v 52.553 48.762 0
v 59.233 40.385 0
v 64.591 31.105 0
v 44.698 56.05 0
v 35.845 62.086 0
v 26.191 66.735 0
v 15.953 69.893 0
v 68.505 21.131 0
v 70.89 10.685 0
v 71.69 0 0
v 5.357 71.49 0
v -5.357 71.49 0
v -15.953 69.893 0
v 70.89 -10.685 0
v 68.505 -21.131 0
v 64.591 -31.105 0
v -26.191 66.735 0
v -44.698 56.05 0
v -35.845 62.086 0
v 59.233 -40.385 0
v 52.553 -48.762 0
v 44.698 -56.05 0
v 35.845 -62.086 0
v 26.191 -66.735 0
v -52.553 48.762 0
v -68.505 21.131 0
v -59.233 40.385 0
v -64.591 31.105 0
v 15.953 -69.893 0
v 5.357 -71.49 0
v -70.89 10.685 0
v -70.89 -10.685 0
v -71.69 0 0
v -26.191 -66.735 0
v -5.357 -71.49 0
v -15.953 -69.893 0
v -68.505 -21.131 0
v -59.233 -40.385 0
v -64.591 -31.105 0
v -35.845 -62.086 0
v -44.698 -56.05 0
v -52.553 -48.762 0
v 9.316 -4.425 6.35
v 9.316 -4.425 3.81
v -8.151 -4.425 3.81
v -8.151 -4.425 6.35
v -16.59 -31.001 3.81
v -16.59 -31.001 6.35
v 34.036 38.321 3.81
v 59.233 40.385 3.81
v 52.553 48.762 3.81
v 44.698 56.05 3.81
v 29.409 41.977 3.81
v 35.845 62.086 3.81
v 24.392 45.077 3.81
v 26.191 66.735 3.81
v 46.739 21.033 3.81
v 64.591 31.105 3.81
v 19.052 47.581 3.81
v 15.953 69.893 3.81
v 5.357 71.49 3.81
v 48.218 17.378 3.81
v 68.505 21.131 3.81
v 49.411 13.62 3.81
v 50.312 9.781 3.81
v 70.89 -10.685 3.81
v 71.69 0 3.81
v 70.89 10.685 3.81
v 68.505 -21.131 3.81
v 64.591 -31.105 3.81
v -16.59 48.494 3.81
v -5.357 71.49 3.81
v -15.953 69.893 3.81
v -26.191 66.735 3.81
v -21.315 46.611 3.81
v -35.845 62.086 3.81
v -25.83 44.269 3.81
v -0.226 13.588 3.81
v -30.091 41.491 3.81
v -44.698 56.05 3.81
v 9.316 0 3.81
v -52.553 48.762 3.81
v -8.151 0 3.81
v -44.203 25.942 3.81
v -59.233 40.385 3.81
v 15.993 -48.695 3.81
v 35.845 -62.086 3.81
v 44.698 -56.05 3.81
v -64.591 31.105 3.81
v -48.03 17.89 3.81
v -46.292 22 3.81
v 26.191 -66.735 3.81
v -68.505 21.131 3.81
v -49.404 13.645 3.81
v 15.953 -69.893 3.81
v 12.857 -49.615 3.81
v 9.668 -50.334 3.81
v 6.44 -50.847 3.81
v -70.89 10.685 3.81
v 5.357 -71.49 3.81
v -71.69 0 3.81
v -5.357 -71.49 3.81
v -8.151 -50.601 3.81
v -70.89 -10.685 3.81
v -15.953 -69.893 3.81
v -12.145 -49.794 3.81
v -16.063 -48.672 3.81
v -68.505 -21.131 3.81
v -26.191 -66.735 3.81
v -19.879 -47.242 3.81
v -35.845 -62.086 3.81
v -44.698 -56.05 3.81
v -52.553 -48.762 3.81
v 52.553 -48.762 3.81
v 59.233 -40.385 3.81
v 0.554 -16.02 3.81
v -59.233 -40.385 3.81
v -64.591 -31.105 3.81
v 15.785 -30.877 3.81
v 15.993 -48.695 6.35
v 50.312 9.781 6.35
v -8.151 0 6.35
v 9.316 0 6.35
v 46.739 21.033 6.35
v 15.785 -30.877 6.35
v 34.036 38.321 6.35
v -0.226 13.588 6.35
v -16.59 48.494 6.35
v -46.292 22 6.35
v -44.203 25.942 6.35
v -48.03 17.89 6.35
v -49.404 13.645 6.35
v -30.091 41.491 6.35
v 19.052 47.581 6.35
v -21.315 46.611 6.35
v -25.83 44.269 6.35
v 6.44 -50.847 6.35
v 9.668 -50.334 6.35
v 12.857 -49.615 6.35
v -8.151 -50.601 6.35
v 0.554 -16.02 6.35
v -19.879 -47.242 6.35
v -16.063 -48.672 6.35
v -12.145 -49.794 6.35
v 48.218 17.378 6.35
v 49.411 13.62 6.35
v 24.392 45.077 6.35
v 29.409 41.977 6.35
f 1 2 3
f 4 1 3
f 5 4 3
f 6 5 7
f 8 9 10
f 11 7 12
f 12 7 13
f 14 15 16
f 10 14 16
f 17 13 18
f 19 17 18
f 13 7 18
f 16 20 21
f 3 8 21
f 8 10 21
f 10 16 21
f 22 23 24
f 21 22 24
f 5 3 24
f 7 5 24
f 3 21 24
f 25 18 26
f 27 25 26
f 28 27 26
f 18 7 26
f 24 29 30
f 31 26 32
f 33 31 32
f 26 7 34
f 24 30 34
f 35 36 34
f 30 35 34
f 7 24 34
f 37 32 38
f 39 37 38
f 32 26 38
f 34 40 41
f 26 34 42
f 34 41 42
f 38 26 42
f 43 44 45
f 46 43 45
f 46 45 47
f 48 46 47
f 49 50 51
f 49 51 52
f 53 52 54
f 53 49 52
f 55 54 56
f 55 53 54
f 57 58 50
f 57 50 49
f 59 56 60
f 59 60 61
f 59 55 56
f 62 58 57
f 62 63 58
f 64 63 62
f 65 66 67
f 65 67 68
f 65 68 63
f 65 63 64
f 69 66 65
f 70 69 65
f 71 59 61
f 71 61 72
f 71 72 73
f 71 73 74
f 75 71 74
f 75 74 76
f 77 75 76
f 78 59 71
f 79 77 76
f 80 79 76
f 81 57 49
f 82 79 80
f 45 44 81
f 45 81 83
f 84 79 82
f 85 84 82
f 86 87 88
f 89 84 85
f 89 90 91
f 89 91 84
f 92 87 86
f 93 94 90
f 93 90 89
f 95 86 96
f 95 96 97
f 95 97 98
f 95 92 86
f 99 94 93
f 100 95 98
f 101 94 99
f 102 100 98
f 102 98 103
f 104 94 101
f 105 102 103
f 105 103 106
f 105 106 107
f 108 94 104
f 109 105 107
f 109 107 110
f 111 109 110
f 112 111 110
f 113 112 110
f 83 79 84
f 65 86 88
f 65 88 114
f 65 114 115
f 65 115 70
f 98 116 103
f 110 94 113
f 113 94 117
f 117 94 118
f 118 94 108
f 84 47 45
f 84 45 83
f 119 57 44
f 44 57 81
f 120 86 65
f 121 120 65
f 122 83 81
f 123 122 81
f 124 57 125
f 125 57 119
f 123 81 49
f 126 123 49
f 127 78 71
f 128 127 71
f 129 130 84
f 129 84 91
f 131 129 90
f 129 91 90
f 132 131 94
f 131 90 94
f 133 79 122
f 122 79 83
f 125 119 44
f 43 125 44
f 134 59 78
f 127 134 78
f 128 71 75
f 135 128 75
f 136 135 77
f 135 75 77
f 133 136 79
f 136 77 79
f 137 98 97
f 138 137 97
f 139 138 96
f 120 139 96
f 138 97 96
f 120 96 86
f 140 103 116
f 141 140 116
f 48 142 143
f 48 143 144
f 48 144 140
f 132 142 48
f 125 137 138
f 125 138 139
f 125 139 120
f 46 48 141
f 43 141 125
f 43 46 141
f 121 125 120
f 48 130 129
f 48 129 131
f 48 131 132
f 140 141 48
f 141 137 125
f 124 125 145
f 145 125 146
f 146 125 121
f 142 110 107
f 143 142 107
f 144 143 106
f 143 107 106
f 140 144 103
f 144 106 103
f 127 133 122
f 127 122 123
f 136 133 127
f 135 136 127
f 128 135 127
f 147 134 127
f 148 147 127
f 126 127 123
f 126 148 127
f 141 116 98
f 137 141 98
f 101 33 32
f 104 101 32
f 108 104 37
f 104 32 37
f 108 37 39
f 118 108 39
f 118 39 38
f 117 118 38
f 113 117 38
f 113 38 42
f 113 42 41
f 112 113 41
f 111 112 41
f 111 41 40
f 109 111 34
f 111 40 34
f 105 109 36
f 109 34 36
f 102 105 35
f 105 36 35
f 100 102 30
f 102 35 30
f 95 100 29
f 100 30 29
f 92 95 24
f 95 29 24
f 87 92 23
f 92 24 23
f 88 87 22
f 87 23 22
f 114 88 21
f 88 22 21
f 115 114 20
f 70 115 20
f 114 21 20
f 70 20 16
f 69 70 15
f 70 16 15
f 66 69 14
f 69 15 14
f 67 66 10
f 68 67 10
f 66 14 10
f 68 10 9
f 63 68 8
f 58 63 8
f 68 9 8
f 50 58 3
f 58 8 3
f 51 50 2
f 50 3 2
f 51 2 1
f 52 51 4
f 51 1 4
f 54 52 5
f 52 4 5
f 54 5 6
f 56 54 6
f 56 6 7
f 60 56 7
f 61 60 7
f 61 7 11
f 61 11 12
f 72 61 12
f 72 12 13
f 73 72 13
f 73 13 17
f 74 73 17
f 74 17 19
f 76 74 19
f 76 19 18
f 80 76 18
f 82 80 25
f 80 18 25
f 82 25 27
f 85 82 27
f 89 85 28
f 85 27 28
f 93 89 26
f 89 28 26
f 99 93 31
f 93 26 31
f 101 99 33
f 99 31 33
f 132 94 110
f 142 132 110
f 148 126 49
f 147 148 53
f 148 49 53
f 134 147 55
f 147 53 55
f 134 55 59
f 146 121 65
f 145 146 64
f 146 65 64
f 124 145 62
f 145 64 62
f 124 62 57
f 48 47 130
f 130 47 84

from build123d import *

# Parameters (mm, degrees)
SKETCH1_R            = 58.990480392
BOSS_EXTRUDE4_DEPTH  = 3.81
BOSS_EXTRUDE8_DEPTH  = 6.35
BOSS_EXTRUDE11_DEPTH = 6.35
BOSS_EXTRUDE12_DEPTH = 1.27
BOSS_EXTRUDE13_DEPTH = 3.81
SKETCH1_10_R         = 71.690480392
BOSS_EXTRUDE14_DEPTH = 3.81


with BuildPart() as part:
    # Sketch1 → Boss-Extrude4 (new body)
    with BuildSketch(Plane.XY):
        Circle(SKETCH1_R)
        with BuildLine():
            ThreePointArc((-44.203304283, 25.942359996), (-37.95196843, 34.446861163), (-30.091128704, 41.490506444))
            ThreePointArc((-30.091128704, 41.490506444), (-23.601953109, 45.495999397), (-16.590293497, 48.494332797))
            ThreePointArc((-16.590293497, 48.494332797), (1.313009125, 51.236843763), (19.052344379, 47.580944982))
            ThreePointArc((19.052344379, 47.580944982), (26.945123943, 43.599294116), (34.03630553, 38.320595736))
            ThreePointArc((34.03630553, 38.320595736), (41.302460875, 30.348721182), (46.739319117, 21.032693603))
            ThreePointArc((46.739319117, 21.032693603), (48.850499882, 15.510216406), (50.311661027, 9.781355549))
            ThreePointArc((50.311661027, 9.781355549), (51.017620288, 4.913305593), (51.253664764, 0))
            ThreePointArc((51.253664764, 0), (41.512829585, -30.060324875), (15.99284446, -48.694630893))
            ThreePointArc((15.99284446, -48.694630893), (11.267949041, -49.99971476), (6.439988792, -50.847464992))
            ThreePointArc((6.439988792, -50.847464992), (-0.864374418, -51.246375565), (-8.151129624, -50.601356084))
            ThreePointArc((-8.151129624, -50.601356084), (-14.115327494, -49.271651905), (-19.878887571, -47.24159164))
            ThreePointArc((-19.878887571, -47.24159164), (-46.117469302, -22.363299776), (-49.403992946, 13.644912337))
            ThreePointArc((-49.403992946, 13.644912337), (-47.205808206, 19.963712664), (-44.203304283, 25.942359996))
        make_face(mode=Mode.SUBTRACT)
    extrude(amount=BOSS_EXTRUDE4_DEPTH)

    # Sketch1<5> → Boss-Extrude8 (add)
    with BuildSketch(Plane.XY):
        with BuildLine():
            ThreePointArc((-16.590293497, 48.494332797), (-23.601953109, 45.495999397), (-30.091128704, 41.490506444))
            Line((-30.091128704, 41.490506444), (-8.151129624, 0))
            Line((-8.151129624, 0), (9.315576713, 0))
            Line((9.315576713, 0), (34.03630553, 38.320595736))
            ThreePointArc((34.03630553, 38.320595736), (26.945123943, 43.599294116), (19.052344379, 47.580944982))
            Line((19.052344379, 47.580944982), (-0.226270451, 13.588304137))
            Line((-0.226270451, 13.588304137), (-16.590293497, 48.494332797))
        make_face()
    extrude(amount=BOSS_EXTRUDE8_DEPTH)

    # Sketch1<7> → Boss-Extrude11 (add)
    with BuildSketch(Plane.XY):
        with BuildLine():
            Line((-16.590293497, -31.001033422), (-44.203304283, 25.942359996))
            ThreePointArc((-44.203304283, 25.942359996), (-47.205808206, 19.963712664), (-49.403992946, 13.644912337))
            Line((-49.403992946, 13.644912337), (-19.878887571, -47.24159164))
            ThreePointArc((-19.878887571, -47.24159164), (-14.115327494, -49.271651905), (-8.151129624, -50.601356084))
            Line((-8.151129624, -50.601356084), (0.554492374, -16.020255387))
            Line((0.554492374, -16.020255387), (6.439988792, -50.847464992))
            ThreePointArc((6.439988792, -50.847464992), (11.267949041, -49.99971476), (15.99284446, -48.694630893))
            Line((15.99284446, -48.694630893), (50.311661027, 9.781355549))
            ThreePointArc((50.311661027, 9.781355549), (48.850499882, 15.510216406), (46.739319117, 21.032693603))
            Line((46.739319117, 21.032693603), (15.784668638, -30.877460179))
            Line((15.784668638, -30.877460179), (9.315576713, -4.424898939))
            Line((9.315576713, -4.424898939), (-8.151129624, -4.424898939))
            Line((-8.151129624, -4.424898939), (-16.590293497, -31.001033422))
        make_face()
    extrude(amount=BOSS_EXTRUDE11_DEPTH)

    # Sketch1<8> → Boss-Extrude12 (add)
    with BuildSketch(Plane.XY):
        with BuildLine():
            ThreePointArc((-16.590293497, 48.494332797), (-23.601953109, 45.495999397), (-30.091128704, 41.490506444))
            Line((-30.091128704, 41.490506444), (-8.151129624, 0))
            Line((-8.151129624, 0), (9.315576713, 0))
            Line((9.315576713, 0), (34.03630553, 38.320595736))
            ThreePointArc((34.03630553, 38.320595736), (26.945123943, 43.599294116), (19.052344379, 47.580944982))
            Line((19.052344379, 47.580944982), (-0.226270451, 13.588304137))
            Line((-0.226270451, 13.588304137), (-16.590293497, 48.494332797))
        make_face()
    extrude(amount=BOSS_EXTRUDE12_DEPTH)

    # Sketch1<9> → Boss-Extrude13 (add)
    with BuildSketch(Plane.XY):
        with BuildLine():
            ThreePointArc((-16.590293497, 48.494332797), (-23.601953109, 45.495999397), (-30.091128704, 41.490506444))
            Line((-30.091128704, 41.490506444), (-8.151129624, 0))
            Line((-8.151129624, 0), (9.315576713, 0))
            Line((9.315576713, 0), (34.03630553, 38.320595736))
            ThreePointArc((34.03630553, 38.320595736), (26.945123943, 43.599294116), (19.052344379, 47.580944982))
            Line((19.052344379, 47.580944982), (-0.226270451, 13.588304137))
            Line((-0.226270451, 13.588304137), (-16.590293497, 48.494332797))
        make_face()
        with BuildLine():
            Line((-16.590293497, -31.001033422), (-44.203304283, 25.942359996))
            ThreePointArc((-44.203304283, 25.942359996), (-47.205808206, 19.963712664), (-49.403992946, 13.644912337))
            Line((-49.403992946, 13.644912337), (-19.878887571, -47.24159164))
            ThreePointArc((-19.878887571, -47.24159164), (-14.115327494, -49.271651905), (-8.151129624, -50.601356084))
            Line((-8.151129624, -50.601356084), (0.554492374, -16.020255387))
            Line((0.554492374, -16.020255387), (6.439988792, -50.847464992))
            ThreePointArc((6.439988792, -50.847464992), (11.267949041, -49.99971476), (15.99284446, -48.694630893))
            Line((15.99284446, -48.694630893), (50.311661027, 9.781355549))
            ThreePointArc((50.311661027, 9.781355549), (48.850499882, 15.510216406), (46.739319117, 21.032693603))
            Line((46.739319117, 21.032693603), (15.784668638, -30.877460179))
            Line((15.784668638, -30.877460179), (9.315576713, -4.424898939))
            Line((9.315576713, -4.424898939), (-8.151129624, -4.424898939))
            Line((-8.151129624, -4.424898939), (-16.590293497, -31.001033422))
        make_face()
    extrude(amount=BOSS_EXTRUDE13_DEPTH)

    # Sketch1<10> → Boss-Extrude14 (add)
    with BuildSketch(Plane.XY):
        Circle(SKETCH1_10_R)
    extrude(amount=BOSS_EXTRUDE14_DEPTH)


solid = part.part
